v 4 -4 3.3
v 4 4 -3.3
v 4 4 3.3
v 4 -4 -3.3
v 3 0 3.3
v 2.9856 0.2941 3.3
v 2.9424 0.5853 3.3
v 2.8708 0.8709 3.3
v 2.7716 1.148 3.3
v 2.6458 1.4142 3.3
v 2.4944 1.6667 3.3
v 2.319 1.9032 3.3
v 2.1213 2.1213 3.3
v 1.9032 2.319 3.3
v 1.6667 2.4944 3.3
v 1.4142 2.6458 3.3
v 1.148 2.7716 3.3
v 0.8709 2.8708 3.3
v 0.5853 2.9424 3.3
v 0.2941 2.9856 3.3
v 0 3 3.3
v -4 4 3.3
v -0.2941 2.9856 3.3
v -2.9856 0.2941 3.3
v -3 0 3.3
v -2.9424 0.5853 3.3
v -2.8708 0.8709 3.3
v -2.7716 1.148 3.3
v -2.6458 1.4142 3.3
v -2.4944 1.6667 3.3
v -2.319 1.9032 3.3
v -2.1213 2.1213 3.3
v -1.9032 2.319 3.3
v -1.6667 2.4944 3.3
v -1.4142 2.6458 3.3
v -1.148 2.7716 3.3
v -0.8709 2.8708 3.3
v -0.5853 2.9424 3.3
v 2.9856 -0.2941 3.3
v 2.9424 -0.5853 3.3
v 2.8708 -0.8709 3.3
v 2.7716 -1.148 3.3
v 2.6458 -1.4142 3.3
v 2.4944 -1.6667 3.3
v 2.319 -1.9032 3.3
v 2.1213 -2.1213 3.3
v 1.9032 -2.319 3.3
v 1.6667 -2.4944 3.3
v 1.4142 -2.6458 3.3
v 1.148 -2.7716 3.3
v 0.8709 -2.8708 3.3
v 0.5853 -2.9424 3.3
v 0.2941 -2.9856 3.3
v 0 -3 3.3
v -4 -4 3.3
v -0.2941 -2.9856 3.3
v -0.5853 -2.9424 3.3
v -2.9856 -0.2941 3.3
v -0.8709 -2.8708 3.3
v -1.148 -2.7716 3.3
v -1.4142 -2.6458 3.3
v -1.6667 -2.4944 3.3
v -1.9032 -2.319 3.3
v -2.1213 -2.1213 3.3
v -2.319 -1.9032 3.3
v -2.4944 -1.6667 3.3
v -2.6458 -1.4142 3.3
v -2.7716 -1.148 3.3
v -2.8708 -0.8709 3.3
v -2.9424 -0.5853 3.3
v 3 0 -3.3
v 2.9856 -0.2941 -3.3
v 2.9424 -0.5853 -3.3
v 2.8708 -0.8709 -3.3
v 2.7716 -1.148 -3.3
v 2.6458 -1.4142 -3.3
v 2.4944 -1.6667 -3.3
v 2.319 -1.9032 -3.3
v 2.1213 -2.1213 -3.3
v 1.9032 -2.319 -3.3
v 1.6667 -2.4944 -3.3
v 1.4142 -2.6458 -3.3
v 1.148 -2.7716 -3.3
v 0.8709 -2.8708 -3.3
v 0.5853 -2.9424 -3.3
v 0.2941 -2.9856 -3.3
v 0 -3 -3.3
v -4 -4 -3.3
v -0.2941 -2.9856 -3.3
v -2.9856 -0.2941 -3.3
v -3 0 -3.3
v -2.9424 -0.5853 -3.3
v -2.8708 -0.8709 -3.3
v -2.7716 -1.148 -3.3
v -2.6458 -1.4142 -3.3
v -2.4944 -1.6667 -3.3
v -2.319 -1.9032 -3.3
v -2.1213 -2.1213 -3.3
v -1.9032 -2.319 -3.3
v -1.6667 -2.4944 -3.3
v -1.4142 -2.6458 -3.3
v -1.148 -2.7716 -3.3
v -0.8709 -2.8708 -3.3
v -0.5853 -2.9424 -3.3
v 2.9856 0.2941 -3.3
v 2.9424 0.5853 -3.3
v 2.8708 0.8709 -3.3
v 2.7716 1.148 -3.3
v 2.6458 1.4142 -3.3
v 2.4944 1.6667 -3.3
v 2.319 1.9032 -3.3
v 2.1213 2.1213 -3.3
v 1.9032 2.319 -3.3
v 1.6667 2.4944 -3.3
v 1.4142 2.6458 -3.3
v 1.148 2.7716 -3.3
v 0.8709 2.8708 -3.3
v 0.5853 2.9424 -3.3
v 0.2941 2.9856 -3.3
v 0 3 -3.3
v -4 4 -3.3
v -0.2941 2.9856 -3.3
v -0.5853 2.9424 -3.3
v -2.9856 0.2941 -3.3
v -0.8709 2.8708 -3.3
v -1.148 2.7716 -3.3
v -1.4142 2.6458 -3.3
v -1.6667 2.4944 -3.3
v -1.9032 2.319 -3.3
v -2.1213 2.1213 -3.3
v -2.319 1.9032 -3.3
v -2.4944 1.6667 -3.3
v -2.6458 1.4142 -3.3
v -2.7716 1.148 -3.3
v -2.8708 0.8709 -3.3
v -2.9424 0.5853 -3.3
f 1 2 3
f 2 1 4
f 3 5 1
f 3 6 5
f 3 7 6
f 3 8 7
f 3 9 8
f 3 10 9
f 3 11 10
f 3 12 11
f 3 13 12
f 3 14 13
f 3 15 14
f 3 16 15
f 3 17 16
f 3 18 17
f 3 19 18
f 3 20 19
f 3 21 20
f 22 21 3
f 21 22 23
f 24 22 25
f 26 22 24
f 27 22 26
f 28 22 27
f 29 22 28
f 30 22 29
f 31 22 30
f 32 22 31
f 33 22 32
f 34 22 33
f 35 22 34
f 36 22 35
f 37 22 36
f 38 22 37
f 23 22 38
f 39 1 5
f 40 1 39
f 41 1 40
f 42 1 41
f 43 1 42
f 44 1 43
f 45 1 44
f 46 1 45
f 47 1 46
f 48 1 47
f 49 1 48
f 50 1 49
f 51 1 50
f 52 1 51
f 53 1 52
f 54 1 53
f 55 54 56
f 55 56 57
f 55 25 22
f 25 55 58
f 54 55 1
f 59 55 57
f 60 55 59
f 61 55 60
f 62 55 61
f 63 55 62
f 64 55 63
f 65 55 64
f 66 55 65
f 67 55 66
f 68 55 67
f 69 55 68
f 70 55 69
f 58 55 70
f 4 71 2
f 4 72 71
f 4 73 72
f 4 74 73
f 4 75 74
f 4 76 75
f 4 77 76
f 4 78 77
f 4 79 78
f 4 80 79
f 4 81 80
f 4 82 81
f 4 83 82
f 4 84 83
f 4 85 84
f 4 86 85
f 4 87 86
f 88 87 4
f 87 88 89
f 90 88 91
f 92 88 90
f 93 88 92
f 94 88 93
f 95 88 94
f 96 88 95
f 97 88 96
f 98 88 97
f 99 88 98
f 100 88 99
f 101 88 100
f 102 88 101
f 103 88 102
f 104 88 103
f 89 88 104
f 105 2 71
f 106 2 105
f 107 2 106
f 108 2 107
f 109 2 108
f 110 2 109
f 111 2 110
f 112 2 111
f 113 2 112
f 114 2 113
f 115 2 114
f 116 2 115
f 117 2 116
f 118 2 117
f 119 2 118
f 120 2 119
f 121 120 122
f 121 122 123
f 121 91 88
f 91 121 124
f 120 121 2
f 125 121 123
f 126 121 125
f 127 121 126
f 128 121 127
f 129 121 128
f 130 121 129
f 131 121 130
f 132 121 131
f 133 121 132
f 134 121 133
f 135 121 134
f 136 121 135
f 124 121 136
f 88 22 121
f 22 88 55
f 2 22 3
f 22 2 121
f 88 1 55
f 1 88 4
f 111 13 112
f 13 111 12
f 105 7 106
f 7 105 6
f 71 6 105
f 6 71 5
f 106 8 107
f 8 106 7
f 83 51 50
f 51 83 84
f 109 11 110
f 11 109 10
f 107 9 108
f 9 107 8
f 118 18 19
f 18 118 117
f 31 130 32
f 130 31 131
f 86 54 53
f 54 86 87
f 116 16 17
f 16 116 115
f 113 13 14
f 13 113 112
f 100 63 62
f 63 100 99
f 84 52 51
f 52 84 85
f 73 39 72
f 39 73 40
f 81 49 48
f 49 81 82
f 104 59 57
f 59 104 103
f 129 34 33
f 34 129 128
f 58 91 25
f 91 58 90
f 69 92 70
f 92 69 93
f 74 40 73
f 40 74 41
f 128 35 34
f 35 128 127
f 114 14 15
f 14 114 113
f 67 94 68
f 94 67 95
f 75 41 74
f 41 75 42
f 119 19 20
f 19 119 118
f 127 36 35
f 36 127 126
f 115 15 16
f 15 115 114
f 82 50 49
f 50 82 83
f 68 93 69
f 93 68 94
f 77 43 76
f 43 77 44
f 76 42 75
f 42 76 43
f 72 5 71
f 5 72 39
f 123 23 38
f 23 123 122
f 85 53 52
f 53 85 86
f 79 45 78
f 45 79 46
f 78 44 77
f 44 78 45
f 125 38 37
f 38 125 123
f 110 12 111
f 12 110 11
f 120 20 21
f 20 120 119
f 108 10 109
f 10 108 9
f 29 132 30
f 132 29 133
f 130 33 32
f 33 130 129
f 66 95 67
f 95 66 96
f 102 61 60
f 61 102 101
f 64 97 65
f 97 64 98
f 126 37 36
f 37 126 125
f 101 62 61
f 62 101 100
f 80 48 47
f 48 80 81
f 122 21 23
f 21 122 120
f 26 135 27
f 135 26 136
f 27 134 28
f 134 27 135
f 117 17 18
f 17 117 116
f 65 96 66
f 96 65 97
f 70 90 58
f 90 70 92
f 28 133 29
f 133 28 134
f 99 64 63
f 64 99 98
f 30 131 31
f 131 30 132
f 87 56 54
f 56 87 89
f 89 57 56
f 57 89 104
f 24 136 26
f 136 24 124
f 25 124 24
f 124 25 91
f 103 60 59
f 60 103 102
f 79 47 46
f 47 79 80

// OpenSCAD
module t_slot_nut() {
    difference() {
        // Main body of the T-slot nut
        cube([8, 8, 6.6], center=true);
        
        // Hole for the screw
        translate([0, 0, -3.3])
            cylinder(h=10, d=6, $fn=64);
    }
}

t_slot_nut();
